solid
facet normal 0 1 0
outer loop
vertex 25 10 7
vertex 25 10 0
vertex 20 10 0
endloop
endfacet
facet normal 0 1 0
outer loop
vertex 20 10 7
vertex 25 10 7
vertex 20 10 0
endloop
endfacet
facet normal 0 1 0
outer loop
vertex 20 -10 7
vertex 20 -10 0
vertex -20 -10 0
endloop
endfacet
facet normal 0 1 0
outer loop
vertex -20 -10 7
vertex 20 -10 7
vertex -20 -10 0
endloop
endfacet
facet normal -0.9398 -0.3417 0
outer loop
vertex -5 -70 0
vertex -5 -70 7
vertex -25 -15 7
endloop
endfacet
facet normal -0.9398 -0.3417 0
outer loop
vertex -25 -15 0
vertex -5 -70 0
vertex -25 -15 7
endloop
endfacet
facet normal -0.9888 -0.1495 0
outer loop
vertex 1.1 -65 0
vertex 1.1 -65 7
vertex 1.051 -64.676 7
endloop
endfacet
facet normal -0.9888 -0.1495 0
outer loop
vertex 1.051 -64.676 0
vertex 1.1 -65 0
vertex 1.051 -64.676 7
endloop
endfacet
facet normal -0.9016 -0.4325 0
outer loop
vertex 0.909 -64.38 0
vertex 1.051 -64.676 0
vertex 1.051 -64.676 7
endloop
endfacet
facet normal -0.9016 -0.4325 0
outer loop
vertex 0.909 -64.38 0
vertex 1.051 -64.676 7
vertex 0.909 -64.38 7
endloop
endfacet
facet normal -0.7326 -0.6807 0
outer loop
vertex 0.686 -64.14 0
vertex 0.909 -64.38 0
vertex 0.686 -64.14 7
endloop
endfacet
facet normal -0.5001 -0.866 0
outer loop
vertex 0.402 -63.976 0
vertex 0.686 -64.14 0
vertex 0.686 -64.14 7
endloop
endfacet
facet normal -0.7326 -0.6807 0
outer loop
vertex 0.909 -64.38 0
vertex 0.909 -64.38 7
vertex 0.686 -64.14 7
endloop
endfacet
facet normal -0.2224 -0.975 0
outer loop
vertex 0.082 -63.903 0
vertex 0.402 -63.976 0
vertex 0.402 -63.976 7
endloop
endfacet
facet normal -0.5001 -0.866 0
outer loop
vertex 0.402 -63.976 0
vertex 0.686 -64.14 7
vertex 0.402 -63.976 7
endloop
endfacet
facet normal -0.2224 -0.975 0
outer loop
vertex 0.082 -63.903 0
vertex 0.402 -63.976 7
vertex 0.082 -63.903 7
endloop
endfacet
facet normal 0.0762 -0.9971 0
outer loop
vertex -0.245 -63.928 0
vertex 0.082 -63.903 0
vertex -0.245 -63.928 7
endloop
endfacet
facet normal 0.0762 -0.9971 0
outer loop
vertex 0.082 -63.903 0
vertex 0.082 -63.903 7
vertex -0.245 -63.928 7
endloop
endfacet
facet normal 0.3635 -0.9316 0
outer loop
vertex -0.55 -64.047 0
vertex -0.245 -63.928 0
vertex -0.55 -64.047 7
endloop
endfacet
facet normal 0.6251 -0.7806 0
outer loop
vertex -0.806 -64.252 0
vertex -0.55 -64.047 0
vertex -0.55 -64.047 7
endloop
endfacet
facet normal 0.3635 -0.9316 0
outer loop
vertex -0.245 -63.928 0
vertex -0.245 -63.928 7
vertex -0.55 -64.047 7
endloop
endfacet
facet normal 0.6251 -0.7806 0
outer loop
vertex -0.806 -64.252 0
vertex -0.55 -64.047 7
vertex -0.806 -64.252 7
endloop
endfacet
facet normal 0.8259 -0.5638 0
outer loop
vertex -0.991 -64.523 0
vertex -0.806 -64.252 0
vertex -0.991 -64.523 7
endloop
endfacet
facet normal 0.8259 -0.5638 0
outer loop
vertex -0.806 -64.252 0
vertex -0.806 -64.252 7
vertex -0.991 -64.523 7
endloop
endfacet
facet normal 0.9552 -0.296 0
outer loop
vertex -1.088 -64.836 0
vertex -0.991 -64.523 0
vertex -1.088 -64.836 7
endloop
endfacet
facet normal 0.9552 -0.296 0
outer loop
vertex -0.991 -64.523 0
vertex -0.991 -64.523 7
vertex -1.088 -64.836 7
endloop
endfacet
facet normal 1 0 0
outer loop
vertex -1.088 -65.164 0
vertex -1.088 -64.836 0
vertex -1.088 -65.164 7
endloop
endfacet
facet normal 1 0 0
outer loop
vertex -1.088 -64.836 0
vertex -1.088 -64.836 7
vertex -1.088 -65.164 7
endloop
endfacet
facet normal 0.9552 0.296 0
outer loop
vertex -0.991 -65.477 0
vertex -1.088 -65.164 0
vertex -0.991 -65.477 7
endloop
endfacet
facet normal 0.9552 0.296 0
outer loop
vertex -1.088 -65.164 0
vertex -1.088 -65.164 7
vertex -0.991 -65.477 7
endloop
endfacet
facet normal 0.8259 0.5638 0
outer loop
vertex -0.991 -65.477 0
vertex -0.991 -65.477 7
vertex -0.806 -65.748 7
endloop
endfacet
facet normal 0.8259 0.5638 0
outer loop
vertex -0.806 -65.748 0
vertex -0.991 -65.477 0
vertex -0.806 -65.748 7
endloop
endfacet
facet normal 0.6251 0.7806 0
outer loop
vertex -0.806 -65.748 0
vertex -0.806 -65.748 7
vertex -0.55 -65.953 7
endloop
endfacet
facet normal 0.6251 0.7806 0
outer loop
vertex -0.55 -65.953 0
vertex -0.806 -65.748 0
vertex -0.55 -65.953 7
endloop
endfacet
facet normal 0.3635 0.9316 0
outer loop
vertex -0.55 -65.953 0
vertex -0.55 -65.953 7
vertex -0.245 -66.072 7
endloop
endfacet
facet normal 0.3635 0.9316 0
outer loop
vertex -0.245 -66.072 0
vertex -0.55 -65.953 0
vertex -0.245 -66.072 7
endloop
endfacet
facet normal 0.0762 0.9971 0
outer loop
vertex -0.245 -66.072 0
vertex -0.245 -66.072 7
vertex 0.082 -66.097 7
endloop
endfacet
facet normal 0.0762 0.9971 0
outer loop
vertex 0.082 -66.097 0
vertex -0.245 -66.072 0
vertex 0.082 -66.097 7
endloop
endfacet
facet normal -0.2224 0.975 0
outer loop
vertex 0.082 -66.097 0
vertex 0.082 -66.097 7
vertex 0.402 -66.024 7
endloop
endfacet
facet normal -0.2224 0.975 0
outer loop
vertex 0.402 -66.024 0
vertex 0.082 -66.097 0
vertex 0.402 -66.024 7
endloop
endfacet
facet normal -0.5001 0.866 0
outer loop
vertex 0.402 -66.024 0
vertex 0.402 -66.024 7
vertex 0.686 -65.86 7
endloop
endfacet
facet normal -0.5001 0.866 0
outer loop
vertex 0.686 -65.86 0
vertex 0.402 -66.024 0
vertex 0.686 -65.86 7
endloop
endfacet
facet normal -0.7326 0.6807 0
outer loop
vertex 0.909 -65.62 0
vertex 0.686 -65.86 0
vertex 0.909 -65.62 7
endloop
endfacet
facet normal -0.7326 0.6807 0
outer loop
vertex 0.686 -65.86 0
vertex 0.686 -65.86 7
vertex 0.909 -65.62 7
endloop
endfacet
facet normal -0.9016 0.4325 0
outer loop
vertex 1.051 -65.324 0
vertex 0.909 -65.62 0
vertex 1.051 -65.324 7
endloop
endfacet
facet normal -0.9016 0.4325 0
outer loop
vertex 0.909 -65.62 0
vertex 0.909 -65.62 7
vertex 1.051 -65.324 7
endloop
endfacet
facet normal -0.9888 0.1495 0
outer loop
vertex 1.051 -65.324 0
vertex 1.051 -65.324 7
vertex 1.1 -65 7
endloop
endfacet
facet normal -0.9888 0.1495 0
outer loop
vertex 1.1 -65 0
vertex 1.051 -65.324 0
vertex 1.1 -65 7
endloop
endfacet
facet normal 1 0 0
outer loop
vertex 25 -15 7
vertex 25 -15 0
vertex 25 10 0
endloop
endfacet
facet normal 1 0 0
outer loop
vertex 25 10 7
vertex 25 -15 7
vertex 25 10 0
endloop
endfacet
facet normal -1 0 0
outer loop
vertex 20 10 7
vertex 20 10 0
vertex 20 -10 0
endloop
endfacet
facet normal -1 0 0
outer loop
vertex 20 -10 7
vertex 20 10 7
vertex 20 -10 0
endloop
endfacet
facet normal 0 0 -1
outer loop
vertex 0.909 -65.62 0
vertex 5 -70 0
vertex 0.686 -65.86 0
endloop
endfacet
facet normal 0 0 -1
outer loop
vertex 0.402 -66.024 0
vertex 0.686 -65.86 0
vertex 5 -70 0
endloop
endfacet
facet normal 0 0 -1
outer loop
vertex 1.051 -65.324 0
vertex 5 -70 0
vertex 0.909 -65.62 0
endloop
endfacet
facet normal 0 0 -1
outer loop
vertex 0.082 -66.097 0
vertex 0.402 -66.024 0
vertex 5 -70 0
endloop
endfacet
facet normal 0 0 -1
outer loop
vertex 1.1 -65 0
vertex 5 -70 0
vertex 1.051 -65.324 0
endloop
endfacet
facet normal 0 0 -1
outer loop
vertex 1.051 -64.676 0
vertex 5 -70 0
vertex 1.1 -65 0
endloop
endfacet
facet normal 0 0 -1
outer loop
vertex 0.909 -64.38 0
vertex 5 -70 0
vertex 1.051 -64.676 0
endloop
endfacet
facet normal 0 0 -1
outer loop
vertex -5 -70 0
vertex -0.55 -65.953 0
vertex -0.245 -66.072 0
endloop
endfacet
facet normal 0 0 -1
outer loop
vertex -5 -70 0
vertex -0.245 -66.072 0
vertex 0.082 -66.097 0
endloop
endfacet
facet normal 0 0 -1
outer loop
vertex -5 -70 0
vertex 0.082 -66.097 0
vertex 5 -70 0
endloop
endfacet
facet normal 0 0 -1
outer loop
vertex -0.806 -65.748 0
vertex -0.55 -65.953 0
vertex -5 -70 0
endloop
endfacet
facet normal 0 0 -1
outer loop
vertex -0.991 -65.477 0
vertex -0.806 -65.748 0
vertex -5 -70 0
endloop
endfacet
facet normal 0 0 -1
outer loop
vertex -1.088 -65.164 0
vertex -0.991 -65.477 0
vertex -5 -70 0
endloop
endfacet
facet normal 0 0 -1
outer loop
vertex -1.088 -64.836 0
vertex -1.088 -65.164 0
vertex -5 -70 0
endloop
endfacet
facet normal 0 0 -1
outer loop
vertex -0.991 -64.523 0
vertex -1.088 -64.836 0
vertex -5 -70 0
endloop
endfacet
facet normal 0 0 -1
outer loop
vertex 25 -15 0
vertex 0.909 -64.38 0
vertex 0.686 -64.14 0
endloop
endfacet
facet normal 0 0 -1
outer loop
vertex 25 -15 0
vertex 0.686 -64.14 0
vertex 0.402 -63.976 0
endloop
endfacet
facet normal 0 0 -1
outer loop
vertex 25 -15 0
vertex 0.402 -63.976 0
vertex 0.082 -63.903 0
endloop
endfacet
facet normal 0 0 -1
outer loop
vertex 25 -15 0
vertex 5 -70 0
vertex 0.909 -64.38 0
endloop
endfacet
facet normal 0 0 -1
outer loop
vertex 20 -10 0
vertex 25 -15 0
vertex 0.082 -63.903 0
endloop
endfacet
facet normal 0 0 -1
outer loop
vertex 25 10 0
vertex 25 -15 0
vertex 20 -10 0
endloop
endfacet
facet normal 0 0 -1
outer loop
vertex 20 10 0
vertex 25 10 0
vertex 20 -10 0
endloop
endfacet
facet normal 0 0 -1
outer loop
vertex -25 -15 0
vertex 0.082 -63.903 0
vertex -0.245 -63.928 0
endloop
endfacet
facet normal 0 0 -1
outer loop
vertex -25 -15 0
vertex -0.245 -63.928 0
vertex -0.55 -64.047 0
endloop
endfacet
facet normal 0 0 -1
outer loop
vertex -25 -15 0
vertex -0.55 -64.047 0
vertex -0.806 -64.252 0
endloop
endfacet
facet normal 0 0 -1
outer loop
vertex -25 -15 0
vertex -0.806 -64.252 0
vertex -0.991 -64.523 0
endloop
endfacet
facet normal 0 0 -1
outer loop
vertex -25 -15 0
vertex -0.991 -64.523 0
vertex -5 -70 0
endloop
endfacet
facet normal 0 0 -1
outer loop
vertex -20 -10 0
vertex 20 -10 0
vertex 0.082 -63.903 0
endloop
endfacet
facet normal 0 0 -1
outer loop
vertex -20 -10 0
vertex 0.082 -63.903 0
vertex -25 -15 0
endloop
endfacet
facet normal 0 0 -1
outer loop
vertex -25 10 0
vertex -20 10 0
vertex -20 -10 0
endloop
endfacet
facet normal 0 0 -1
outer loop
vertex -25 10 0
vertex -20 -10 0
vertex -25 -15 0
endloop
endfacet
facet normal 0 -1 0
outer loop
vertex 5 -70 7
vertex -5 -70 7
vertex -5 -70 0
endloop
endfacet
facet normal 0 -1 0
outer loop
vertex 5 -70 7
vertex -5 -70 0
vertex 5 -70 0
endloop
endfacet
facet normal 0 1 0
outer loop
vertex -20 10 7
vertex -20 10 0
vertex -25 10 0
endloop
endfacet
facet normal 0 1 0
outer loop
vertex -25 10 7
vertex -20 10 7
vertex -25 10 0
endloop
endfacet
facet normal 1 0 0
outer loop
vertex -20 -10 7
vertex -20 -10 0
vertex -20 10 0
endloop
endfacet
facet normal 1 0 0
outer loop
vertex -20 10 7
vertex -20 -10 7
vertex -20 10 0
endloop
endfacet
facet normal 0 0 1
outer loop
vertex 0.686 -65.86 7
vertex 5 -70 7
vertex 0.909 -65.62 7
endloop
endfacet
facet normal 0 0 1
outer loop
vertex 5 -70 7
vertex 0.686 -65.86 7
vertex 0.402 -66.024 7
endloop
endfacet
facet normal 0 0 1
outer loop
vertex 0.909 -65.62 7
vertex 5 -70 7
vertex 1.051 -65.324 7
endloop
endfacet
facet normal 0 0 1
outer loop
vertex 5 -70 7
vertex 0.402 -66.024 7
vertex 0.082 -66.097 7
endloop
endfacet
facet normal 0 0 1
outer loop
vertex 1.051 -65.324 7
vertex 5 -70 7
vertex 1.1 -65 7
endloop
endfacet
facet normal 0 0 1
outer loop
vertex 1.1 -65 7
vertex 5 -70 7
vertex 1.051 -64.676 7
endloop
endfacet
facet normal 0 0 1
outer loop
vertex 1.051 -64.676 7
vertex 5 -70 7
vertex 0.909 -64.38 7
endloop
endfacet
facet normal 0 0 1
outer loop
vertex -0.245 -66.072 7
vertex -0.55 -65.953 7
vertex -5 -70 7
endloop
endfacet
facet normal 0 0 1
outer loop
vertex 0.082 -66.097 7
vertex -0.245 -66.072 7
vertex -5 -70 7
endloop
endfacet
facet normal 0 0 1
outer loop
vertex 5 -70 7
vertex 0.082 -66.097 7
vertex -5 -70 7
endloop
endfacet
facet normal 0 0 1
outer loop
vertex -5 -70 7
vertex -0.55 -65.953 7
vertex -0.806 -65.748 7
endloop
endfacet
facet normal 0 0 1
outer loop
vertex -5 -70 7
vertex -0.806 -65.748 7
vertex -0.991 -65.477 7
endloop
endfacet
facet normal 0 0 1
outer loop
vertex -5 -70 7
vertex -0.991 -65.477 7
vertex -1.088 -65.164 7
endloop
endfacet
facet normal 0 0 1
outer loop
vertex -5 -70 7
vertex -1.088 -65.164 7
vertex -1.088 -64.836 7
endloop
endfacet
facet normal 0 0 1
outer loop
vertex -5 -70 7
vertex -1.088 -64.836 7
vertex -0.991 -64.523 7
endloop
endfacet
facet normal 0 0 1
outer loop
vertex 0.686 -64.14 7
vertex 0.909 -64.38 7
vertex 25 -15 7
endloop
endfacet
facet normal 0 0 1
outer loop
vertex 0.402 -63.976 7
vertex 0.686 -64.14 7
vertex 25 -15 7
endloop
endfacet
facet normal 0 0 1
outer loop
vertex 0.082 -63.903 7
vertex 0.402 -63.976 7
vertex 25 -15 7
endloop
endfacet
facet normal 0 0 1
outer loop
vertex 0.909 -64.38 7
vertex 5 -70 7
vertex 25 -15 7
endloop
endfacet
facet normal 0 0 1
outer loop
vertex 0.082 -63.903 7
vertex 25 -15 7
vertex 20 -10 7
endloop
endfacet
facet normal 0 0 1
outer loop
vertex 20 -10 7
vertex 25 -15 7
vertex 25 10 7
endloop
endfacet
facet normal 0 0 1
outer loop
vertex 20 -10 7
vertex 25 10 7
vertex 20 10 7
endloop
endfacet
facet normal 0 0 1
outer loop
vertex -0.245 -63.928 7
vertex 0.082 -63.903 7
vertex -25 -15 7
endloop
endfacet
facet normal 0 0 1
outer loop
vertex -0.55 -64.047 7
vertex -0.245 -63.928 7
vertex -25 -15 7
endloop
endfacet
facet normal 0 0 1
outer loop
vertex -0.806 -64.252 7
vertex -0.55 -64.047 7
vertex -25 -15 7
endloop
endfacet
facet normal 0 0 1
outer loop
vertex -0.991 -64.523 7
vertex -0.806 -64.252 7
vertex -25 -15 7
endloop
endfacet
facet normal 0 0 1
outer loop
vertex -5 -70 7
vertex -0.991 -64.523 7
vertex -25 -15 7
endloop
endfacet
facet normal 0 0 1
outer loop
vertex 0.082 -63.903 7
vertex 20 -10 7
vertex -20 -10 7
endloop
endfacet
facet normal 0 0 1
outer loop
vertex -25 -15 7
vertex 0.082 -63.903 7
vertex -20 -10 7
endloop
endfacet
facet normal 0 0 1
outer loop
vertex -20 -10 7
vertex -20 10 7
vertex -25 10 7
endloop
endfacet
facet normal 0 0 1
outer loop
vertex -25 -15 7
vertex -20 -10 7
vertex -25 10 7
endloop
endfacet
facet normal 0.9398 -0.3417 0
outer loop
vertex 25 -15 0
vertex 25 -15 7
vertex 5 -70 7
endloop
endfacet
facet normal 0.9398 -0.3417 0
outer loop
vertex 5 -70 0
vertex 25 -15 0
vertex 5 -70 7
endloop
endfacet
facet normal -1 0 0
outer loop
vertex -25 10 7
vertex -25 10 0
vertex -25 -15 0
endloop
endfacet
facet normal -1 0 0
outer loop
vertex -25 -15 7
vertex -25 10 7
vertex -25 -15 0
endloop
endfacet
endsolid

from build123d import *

# Parameters (mm, degrees)
SALIENTE_EXTRUIR1_DEPTH = 7
CROQUIS2_W              = 10
CROQUIS2_H              = 10
CROQUIS2_R              = 1.1
SALIENTE_EXTRUIR2_DEPTH = 7


with BuildPart() as part:
    # Croquis1 → Saliente-Extruir1 (new body)
    with BuildSketch(Plane.XY):
        Polygon((-20, -10), (-20, 10), (-25, 10), (-25, -15), (25, -15), (25, 10), (20, 10), (20, -10), align=None)
    extrude(amount=SALIENTE_EXTRUIR1_DEPTH)

    # Croquis2 → Saliente-Extruir2 (add)
    # profile 1 of 2: a face of its own
    with BuildSketch(Plane.XY.offset(7)):
        Polygon((-5, -70), (-25, -15), (25, -15), (5, -70), (5, -60), (-5, -60), align=None)
    # profile 2 of 2: a face of its own
    with BuildSketch(Plane.XY.offset(7)):
        with Locations((0, -65)):
            Rectangle(CROQUIS2_W, CROQUIS2_H)
        with Locations((0, -65)):
            Circle(CROQUIS2_R, mode=Mode.SUBTRACT)
    extrude(amount=-SALIENTE_EXTRUIR2_DEPTH)


solid = part.part
